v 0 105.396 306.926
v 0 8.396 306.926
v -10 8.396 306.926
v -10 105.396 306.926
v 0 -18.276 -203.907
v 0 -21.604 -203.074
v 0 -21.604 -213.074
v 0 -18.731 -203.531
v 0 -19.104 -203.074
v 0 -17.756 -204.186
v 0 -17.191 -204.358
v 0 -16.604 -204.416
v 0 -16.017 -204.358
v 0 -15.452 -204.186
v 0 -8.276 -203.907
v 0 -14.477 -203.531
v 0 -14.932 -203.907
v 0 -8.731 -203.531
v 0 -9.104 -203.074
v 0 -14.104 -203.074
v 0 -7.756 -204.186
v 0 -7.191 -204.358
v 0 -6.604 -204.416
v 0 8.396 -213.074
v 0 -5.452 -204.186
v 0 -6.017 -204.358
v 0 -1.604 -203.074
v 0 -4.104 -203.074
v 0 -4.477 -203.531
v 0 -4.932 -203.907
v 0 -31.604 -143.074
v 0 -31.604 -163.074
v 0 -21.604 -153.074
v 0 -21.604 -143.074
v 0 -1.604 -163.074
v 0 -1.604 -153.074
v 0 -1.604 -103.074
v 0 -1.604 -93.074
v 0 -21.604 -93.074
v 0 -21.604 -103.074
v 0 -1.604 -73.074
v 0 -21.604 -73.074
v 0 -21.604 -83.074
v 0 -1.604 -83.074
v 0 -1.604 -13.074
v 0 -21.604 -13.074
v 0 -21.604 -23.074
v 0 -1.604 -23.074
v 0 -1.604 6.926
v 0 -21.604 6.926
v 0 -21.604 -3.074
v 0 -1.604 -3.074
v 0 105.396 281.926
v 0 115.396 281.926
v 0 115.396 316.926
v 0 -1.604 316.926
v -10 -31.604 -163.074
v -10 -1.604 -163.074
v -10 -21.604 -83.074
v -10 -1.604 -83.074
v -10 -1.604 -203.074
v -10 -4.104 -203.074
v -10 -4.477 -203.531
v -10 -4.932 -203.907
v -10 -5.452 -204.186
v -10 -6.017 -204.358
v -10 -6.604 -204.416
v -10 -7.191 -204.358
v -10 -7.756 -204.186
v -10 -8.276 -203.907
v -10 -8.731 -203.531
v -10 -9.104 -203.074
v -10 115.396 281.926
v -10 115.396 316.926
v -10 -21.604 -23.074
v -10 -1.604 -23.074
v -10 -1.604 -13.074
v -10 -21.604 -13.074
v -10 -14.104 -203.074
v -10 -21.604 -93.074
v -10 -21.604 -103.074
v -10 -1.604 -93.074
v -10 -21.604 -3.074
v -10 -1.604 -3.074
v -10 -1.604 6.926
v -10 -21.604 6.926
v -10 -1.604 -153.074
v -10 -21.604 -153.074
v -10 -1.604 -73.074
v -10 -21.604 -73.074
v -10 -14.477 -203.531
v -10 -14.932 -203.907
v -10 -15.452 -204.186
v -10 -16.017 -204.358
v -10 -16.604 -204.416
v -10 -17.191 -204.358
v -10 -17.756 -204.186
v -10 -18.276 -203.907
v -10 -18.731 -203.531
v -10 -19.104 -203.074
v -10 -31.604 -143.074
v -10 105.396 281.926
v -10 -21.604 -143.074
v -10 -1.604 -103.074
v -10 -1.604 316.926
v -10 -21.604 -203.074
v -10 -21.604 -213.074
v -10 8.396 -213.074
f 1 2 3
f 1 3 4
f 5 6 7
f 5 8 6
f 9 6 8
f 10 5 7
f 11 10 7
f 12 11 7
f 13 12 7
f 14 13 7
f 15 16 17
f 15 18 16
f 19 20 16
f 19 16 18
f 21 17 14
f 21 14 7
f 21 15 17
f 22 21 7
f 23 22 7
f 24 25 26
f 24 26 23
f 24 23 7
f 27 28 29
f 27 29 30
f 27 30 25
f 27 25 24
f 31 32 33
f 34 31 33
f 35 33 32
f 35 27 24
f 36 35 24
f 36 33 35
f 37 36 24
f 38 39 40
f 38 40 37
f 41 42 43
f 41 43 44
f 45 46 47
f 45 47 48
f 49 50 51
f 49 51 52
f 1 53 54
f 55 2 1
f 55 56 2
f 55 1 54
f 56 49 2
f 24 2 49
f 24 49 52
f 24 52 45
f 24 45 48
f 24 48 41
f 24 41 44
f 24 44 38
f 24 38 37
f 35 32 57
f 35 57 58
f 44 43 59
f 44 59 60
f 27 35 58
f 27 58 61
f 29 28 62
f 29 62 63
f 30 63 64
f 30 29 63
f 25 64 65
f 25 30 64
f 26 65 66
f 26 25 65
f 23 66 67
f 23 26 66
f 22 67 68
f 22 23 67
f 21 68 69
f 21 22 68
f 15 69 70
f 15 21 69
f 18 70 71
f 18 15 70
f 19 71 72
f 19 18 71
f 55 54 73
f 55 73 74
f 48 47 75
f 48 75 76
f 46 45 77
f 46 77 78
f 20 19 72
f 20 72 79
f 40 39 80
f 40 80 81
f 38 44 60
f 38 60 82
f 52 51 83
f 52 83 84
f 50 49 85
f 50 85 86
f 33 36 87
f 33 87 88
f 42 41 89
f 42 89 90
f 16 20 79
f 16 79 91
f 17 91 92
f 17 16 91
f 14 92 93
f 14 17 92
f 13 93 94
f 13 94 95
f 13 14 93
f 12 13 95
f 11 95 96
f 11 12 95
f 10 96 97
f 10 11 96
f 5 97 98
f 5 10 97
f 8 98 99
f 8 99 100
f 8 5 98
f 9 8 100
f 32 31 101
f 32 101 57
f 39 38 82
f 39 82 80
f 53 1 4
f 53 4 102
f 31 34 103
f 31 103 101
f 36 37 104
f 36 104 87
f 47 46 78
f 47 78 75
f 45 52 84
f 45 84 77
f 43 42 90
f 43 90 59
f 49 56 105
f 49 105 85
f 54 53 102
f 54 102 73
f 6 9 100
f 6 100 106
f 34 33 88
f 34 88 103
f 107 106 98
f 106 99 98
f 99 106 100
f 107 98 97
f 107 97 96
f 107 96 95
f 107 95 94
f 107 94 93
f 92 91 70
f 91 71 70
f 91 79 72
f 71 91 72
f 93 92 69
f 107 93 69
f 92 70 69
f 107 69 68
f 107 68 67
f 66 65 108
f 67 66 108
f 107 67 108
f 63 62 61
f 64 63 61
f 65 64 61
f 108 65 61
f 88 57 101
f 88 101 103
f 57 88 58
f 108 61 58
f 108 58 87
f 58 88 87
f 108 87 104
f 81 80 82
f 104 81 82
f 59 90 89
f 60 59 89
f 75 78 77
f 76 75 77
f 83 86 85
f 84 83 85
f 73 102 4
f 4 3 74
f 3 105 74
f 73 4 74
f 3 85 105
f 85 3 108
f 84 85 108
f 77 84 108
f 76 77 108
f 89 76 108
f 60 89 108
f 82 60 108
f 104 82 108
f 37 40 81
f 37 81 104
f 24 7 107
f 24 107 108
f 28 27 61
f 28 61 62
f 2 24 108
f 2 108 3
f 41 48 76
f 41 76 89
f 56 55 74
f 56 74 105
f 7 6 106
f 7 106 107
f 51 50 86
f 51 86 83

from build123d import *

# Parameters (mm, degrees)
F1_DEPTH = 10


with BuildPart() as f1:
    # F0 (on Right) → F1 (new body)
    with BuildSketch(Plane.YZ):
        with BuildLine():
            Line((115.396181, 316.925998), (-1.603819, 316.925998))
            Line((-1.603819, 316.925998), (-1.603819, 6.925998))
            Line((-1.603819, 6.925998), (-21.603819, 6.925998))
            Line((-21.603819, 6.925998), (-21.603819, -3.074002))
            Line((-21.603819, -3.074002), (-1.603819, -3.074002))
            Line((-1.603819, -3.074002), (-1.603819, -13.074002))
            Line((-1.603819, -13.074002), (-21.603819, -13.074002))
            Line((-21.603819, -13.074002), (-21.603819, -23.074002))
            Line((-21.603819, -23.074002), (-1.603819, -23.074002))
            Line((-1.603819, -23.074002), (-1.603819, -73.074002))
            Line((-1.603819, -73.074002), (-21.603819, -73.074002))
            Line((-21.603819, -73.074002), (-21.603819, -83.074002))
            Line((-21.603819, -83.074002), (-1.603819, -83.074002))
            Line((-1.603819, -83.074002), (-1.603819, -93.074002))
            Line((-1.603819, -93.074002), (-21.603819, -93.074002))
            Line((-21.603819, -93.074002), (-21.603819, -103.074002))
            Line((-21.603819, -103.074002), (-1.603819, -103.074002))
            Line((-1.603819, -103.074002), (-1.603819, -153.074002))
            Line((-1.603819, -153.074002), (-21.603819, -153.074002))
            Line((-21.603819, -153.074002), (-21.603819, -143.074002))
            Line((-21.603819, -143.074002), (-31.603819, -143.074002))
            Line((-31.603819, -143.074002), (-31.603819, -163.074002))
            Line((-31.603819, -163.074002), (-1.603819, -163.074002))
            Line((-1.603819, -163.074002), (-1.603819, -203.074002))
            Line((-1.603819, -203.074002), (-4.103819, -203.074002))
            ThreePointArc((-4.103819, -203.074002), (-6.603819, -204.415689), (-9.103819, -203.074002))
            Line((-9.103819, -203.074002), (-14.103819, -203.074002))
            ThreePointArc((-14.103819, -203.074002), (-16.603819, -204.415689), (-19.103819, -203.074002))
            Line((-19.103819, -203.074002), (-21.603819, -203.074002))
            Line((-21.603819, -203.074002), (-21.603819, -213.074002))
            Line((-21.603819, -213.074002), (8.396181, -213.074002))
            Line((8.396181, -213.074002), (8.396181, 306.925998))
            Line((8.396181, 306.925998), (105.396181, 306.925998))
            Line((105.396181, 306.925998), (105.396181, 281.925998))
            Line((105.396181, 281.925998), (115.396181, 281.925998))
            Line((115.396181, 281.925998), (115.396181, 316.925998))
        make_face()
    extrude(amount=-F1_DEPTH)


solid = f1.part
